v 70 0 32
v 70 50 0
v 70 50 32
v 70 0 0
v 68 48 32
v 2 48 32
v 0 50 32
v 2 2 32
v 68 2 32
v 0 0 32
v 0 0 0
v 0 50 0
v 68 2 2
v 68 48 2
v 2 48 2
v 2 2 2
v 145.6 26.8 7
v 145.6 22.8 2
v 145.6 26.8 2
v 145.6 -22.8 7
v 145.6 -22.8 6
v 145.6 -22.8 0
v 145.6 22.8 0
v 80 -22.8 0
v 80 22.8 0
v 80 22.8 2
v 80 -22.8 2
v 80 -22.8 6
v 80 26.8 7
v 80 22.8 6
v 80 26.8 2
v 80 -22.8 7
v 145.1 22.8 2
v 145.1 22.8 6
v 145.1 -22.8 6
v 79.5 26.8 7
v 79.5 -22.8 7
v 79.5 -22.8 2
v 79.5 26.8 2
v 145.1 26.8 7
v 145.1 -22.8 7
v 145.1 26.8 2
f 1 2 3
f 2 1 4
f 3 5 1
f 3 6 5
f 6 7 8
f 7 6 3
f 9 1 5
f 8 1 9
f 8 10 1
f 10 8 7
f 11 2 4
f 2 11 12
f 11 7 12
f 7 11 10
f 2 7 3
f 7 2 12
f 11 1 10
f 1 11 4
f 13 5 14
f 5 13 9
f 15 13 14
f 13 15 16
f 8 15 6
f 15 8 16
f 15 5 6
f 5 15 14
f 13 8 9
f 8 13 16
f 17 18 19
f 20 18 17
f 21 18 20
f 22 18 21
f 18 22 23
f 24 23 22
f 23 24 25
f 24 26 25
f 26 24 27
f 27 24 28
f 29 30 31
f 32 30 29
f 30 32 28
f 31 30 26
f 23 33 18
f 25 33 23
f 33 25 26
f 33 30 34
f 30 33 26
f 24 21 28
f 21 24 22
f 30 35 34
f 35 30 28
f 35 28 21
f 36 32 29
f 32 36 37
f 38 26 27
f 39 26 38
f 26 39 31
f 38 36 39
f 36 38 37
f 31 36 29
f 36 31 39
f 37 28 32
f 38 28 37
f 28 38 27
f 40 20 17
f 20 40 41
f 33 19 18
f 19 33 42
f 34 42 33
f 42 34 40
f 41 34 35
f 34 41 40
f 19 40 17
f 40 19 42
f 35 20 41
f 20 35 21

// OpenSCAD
// Two-part enclosure for a small electronics board (e.g. Arduino-based temperature logger)
// Prints together in one job: box on the left, upside-down lid on the right, with a 10 mm gap.
// Units: mm. Wall thicknesses are 2 mm (box) and 1.5 mm (lid), with a 0.2 mm clearance
// between lid and box so they do not fuse.

// ---------------- Parameters ----------------
box_x      = 70;    // box outer length (X)
box_y      = 50;    // box outer width (Y)
box_z      = 30;    // box height (Z)
wall       = 2;     // box wall thickness
floor      = 2;     // box floor thickness

lip_t      = 1.5;   // lid lip wall thickness
lip_h      = 4;     // lid lip height (from plate top)
lip_x      = 65.6;  // lid lip outer length (X)
lip_y      = 45.6;  // lid lip outer width (Y)

gap        = 10;    // horizontal gap between box and lid
eps        = 0.5;   // overshoot for clean boolean cuts

$fn = 64;

// Derived: lid plate is the same size as the lip, centred on it
plate_x = lip_x;
plate_y = lip_y;

// ---------------- Model ----------------
union() {
    // Part 1: open-top box, centred in X/Y, resting on z = 0
    difference() {
        cube([box_x, box_y, box_z + floor]);
        translate([wall, wall, floor])
            cube([box_x - 2 * wall, box_y - 2 * wall, box_z + 1]);   // open top cavity
    }

    // Part 2: lid printed upside down: plate with a rectangular lip on top of it
    translate([box_x + gap, -plate_y / 2, 0])
        union() {
            // Base plate, 2 mm thick
            cube([plate_x, plate_y, 2]);
            // Lip: a wall 1.5 mm thick and 4 mm tall, centred on the plate
            translate([0, 0, 2])
                cube([lip_x, lip_y, lip_h]);
        }
        // Small cutouts under the lip arms so the two parts do not fuse at the corners
        translate([box_x + gap - eps, -plate_y / 2, 2])
            cube([eps, plate_y + 4, lip_h + 1]);
        translate([box_x + gap + plate_x - eps, -plate_y / 2, 2])
            cube([eps, plate_y + 4, lip_h + 1]);
}
